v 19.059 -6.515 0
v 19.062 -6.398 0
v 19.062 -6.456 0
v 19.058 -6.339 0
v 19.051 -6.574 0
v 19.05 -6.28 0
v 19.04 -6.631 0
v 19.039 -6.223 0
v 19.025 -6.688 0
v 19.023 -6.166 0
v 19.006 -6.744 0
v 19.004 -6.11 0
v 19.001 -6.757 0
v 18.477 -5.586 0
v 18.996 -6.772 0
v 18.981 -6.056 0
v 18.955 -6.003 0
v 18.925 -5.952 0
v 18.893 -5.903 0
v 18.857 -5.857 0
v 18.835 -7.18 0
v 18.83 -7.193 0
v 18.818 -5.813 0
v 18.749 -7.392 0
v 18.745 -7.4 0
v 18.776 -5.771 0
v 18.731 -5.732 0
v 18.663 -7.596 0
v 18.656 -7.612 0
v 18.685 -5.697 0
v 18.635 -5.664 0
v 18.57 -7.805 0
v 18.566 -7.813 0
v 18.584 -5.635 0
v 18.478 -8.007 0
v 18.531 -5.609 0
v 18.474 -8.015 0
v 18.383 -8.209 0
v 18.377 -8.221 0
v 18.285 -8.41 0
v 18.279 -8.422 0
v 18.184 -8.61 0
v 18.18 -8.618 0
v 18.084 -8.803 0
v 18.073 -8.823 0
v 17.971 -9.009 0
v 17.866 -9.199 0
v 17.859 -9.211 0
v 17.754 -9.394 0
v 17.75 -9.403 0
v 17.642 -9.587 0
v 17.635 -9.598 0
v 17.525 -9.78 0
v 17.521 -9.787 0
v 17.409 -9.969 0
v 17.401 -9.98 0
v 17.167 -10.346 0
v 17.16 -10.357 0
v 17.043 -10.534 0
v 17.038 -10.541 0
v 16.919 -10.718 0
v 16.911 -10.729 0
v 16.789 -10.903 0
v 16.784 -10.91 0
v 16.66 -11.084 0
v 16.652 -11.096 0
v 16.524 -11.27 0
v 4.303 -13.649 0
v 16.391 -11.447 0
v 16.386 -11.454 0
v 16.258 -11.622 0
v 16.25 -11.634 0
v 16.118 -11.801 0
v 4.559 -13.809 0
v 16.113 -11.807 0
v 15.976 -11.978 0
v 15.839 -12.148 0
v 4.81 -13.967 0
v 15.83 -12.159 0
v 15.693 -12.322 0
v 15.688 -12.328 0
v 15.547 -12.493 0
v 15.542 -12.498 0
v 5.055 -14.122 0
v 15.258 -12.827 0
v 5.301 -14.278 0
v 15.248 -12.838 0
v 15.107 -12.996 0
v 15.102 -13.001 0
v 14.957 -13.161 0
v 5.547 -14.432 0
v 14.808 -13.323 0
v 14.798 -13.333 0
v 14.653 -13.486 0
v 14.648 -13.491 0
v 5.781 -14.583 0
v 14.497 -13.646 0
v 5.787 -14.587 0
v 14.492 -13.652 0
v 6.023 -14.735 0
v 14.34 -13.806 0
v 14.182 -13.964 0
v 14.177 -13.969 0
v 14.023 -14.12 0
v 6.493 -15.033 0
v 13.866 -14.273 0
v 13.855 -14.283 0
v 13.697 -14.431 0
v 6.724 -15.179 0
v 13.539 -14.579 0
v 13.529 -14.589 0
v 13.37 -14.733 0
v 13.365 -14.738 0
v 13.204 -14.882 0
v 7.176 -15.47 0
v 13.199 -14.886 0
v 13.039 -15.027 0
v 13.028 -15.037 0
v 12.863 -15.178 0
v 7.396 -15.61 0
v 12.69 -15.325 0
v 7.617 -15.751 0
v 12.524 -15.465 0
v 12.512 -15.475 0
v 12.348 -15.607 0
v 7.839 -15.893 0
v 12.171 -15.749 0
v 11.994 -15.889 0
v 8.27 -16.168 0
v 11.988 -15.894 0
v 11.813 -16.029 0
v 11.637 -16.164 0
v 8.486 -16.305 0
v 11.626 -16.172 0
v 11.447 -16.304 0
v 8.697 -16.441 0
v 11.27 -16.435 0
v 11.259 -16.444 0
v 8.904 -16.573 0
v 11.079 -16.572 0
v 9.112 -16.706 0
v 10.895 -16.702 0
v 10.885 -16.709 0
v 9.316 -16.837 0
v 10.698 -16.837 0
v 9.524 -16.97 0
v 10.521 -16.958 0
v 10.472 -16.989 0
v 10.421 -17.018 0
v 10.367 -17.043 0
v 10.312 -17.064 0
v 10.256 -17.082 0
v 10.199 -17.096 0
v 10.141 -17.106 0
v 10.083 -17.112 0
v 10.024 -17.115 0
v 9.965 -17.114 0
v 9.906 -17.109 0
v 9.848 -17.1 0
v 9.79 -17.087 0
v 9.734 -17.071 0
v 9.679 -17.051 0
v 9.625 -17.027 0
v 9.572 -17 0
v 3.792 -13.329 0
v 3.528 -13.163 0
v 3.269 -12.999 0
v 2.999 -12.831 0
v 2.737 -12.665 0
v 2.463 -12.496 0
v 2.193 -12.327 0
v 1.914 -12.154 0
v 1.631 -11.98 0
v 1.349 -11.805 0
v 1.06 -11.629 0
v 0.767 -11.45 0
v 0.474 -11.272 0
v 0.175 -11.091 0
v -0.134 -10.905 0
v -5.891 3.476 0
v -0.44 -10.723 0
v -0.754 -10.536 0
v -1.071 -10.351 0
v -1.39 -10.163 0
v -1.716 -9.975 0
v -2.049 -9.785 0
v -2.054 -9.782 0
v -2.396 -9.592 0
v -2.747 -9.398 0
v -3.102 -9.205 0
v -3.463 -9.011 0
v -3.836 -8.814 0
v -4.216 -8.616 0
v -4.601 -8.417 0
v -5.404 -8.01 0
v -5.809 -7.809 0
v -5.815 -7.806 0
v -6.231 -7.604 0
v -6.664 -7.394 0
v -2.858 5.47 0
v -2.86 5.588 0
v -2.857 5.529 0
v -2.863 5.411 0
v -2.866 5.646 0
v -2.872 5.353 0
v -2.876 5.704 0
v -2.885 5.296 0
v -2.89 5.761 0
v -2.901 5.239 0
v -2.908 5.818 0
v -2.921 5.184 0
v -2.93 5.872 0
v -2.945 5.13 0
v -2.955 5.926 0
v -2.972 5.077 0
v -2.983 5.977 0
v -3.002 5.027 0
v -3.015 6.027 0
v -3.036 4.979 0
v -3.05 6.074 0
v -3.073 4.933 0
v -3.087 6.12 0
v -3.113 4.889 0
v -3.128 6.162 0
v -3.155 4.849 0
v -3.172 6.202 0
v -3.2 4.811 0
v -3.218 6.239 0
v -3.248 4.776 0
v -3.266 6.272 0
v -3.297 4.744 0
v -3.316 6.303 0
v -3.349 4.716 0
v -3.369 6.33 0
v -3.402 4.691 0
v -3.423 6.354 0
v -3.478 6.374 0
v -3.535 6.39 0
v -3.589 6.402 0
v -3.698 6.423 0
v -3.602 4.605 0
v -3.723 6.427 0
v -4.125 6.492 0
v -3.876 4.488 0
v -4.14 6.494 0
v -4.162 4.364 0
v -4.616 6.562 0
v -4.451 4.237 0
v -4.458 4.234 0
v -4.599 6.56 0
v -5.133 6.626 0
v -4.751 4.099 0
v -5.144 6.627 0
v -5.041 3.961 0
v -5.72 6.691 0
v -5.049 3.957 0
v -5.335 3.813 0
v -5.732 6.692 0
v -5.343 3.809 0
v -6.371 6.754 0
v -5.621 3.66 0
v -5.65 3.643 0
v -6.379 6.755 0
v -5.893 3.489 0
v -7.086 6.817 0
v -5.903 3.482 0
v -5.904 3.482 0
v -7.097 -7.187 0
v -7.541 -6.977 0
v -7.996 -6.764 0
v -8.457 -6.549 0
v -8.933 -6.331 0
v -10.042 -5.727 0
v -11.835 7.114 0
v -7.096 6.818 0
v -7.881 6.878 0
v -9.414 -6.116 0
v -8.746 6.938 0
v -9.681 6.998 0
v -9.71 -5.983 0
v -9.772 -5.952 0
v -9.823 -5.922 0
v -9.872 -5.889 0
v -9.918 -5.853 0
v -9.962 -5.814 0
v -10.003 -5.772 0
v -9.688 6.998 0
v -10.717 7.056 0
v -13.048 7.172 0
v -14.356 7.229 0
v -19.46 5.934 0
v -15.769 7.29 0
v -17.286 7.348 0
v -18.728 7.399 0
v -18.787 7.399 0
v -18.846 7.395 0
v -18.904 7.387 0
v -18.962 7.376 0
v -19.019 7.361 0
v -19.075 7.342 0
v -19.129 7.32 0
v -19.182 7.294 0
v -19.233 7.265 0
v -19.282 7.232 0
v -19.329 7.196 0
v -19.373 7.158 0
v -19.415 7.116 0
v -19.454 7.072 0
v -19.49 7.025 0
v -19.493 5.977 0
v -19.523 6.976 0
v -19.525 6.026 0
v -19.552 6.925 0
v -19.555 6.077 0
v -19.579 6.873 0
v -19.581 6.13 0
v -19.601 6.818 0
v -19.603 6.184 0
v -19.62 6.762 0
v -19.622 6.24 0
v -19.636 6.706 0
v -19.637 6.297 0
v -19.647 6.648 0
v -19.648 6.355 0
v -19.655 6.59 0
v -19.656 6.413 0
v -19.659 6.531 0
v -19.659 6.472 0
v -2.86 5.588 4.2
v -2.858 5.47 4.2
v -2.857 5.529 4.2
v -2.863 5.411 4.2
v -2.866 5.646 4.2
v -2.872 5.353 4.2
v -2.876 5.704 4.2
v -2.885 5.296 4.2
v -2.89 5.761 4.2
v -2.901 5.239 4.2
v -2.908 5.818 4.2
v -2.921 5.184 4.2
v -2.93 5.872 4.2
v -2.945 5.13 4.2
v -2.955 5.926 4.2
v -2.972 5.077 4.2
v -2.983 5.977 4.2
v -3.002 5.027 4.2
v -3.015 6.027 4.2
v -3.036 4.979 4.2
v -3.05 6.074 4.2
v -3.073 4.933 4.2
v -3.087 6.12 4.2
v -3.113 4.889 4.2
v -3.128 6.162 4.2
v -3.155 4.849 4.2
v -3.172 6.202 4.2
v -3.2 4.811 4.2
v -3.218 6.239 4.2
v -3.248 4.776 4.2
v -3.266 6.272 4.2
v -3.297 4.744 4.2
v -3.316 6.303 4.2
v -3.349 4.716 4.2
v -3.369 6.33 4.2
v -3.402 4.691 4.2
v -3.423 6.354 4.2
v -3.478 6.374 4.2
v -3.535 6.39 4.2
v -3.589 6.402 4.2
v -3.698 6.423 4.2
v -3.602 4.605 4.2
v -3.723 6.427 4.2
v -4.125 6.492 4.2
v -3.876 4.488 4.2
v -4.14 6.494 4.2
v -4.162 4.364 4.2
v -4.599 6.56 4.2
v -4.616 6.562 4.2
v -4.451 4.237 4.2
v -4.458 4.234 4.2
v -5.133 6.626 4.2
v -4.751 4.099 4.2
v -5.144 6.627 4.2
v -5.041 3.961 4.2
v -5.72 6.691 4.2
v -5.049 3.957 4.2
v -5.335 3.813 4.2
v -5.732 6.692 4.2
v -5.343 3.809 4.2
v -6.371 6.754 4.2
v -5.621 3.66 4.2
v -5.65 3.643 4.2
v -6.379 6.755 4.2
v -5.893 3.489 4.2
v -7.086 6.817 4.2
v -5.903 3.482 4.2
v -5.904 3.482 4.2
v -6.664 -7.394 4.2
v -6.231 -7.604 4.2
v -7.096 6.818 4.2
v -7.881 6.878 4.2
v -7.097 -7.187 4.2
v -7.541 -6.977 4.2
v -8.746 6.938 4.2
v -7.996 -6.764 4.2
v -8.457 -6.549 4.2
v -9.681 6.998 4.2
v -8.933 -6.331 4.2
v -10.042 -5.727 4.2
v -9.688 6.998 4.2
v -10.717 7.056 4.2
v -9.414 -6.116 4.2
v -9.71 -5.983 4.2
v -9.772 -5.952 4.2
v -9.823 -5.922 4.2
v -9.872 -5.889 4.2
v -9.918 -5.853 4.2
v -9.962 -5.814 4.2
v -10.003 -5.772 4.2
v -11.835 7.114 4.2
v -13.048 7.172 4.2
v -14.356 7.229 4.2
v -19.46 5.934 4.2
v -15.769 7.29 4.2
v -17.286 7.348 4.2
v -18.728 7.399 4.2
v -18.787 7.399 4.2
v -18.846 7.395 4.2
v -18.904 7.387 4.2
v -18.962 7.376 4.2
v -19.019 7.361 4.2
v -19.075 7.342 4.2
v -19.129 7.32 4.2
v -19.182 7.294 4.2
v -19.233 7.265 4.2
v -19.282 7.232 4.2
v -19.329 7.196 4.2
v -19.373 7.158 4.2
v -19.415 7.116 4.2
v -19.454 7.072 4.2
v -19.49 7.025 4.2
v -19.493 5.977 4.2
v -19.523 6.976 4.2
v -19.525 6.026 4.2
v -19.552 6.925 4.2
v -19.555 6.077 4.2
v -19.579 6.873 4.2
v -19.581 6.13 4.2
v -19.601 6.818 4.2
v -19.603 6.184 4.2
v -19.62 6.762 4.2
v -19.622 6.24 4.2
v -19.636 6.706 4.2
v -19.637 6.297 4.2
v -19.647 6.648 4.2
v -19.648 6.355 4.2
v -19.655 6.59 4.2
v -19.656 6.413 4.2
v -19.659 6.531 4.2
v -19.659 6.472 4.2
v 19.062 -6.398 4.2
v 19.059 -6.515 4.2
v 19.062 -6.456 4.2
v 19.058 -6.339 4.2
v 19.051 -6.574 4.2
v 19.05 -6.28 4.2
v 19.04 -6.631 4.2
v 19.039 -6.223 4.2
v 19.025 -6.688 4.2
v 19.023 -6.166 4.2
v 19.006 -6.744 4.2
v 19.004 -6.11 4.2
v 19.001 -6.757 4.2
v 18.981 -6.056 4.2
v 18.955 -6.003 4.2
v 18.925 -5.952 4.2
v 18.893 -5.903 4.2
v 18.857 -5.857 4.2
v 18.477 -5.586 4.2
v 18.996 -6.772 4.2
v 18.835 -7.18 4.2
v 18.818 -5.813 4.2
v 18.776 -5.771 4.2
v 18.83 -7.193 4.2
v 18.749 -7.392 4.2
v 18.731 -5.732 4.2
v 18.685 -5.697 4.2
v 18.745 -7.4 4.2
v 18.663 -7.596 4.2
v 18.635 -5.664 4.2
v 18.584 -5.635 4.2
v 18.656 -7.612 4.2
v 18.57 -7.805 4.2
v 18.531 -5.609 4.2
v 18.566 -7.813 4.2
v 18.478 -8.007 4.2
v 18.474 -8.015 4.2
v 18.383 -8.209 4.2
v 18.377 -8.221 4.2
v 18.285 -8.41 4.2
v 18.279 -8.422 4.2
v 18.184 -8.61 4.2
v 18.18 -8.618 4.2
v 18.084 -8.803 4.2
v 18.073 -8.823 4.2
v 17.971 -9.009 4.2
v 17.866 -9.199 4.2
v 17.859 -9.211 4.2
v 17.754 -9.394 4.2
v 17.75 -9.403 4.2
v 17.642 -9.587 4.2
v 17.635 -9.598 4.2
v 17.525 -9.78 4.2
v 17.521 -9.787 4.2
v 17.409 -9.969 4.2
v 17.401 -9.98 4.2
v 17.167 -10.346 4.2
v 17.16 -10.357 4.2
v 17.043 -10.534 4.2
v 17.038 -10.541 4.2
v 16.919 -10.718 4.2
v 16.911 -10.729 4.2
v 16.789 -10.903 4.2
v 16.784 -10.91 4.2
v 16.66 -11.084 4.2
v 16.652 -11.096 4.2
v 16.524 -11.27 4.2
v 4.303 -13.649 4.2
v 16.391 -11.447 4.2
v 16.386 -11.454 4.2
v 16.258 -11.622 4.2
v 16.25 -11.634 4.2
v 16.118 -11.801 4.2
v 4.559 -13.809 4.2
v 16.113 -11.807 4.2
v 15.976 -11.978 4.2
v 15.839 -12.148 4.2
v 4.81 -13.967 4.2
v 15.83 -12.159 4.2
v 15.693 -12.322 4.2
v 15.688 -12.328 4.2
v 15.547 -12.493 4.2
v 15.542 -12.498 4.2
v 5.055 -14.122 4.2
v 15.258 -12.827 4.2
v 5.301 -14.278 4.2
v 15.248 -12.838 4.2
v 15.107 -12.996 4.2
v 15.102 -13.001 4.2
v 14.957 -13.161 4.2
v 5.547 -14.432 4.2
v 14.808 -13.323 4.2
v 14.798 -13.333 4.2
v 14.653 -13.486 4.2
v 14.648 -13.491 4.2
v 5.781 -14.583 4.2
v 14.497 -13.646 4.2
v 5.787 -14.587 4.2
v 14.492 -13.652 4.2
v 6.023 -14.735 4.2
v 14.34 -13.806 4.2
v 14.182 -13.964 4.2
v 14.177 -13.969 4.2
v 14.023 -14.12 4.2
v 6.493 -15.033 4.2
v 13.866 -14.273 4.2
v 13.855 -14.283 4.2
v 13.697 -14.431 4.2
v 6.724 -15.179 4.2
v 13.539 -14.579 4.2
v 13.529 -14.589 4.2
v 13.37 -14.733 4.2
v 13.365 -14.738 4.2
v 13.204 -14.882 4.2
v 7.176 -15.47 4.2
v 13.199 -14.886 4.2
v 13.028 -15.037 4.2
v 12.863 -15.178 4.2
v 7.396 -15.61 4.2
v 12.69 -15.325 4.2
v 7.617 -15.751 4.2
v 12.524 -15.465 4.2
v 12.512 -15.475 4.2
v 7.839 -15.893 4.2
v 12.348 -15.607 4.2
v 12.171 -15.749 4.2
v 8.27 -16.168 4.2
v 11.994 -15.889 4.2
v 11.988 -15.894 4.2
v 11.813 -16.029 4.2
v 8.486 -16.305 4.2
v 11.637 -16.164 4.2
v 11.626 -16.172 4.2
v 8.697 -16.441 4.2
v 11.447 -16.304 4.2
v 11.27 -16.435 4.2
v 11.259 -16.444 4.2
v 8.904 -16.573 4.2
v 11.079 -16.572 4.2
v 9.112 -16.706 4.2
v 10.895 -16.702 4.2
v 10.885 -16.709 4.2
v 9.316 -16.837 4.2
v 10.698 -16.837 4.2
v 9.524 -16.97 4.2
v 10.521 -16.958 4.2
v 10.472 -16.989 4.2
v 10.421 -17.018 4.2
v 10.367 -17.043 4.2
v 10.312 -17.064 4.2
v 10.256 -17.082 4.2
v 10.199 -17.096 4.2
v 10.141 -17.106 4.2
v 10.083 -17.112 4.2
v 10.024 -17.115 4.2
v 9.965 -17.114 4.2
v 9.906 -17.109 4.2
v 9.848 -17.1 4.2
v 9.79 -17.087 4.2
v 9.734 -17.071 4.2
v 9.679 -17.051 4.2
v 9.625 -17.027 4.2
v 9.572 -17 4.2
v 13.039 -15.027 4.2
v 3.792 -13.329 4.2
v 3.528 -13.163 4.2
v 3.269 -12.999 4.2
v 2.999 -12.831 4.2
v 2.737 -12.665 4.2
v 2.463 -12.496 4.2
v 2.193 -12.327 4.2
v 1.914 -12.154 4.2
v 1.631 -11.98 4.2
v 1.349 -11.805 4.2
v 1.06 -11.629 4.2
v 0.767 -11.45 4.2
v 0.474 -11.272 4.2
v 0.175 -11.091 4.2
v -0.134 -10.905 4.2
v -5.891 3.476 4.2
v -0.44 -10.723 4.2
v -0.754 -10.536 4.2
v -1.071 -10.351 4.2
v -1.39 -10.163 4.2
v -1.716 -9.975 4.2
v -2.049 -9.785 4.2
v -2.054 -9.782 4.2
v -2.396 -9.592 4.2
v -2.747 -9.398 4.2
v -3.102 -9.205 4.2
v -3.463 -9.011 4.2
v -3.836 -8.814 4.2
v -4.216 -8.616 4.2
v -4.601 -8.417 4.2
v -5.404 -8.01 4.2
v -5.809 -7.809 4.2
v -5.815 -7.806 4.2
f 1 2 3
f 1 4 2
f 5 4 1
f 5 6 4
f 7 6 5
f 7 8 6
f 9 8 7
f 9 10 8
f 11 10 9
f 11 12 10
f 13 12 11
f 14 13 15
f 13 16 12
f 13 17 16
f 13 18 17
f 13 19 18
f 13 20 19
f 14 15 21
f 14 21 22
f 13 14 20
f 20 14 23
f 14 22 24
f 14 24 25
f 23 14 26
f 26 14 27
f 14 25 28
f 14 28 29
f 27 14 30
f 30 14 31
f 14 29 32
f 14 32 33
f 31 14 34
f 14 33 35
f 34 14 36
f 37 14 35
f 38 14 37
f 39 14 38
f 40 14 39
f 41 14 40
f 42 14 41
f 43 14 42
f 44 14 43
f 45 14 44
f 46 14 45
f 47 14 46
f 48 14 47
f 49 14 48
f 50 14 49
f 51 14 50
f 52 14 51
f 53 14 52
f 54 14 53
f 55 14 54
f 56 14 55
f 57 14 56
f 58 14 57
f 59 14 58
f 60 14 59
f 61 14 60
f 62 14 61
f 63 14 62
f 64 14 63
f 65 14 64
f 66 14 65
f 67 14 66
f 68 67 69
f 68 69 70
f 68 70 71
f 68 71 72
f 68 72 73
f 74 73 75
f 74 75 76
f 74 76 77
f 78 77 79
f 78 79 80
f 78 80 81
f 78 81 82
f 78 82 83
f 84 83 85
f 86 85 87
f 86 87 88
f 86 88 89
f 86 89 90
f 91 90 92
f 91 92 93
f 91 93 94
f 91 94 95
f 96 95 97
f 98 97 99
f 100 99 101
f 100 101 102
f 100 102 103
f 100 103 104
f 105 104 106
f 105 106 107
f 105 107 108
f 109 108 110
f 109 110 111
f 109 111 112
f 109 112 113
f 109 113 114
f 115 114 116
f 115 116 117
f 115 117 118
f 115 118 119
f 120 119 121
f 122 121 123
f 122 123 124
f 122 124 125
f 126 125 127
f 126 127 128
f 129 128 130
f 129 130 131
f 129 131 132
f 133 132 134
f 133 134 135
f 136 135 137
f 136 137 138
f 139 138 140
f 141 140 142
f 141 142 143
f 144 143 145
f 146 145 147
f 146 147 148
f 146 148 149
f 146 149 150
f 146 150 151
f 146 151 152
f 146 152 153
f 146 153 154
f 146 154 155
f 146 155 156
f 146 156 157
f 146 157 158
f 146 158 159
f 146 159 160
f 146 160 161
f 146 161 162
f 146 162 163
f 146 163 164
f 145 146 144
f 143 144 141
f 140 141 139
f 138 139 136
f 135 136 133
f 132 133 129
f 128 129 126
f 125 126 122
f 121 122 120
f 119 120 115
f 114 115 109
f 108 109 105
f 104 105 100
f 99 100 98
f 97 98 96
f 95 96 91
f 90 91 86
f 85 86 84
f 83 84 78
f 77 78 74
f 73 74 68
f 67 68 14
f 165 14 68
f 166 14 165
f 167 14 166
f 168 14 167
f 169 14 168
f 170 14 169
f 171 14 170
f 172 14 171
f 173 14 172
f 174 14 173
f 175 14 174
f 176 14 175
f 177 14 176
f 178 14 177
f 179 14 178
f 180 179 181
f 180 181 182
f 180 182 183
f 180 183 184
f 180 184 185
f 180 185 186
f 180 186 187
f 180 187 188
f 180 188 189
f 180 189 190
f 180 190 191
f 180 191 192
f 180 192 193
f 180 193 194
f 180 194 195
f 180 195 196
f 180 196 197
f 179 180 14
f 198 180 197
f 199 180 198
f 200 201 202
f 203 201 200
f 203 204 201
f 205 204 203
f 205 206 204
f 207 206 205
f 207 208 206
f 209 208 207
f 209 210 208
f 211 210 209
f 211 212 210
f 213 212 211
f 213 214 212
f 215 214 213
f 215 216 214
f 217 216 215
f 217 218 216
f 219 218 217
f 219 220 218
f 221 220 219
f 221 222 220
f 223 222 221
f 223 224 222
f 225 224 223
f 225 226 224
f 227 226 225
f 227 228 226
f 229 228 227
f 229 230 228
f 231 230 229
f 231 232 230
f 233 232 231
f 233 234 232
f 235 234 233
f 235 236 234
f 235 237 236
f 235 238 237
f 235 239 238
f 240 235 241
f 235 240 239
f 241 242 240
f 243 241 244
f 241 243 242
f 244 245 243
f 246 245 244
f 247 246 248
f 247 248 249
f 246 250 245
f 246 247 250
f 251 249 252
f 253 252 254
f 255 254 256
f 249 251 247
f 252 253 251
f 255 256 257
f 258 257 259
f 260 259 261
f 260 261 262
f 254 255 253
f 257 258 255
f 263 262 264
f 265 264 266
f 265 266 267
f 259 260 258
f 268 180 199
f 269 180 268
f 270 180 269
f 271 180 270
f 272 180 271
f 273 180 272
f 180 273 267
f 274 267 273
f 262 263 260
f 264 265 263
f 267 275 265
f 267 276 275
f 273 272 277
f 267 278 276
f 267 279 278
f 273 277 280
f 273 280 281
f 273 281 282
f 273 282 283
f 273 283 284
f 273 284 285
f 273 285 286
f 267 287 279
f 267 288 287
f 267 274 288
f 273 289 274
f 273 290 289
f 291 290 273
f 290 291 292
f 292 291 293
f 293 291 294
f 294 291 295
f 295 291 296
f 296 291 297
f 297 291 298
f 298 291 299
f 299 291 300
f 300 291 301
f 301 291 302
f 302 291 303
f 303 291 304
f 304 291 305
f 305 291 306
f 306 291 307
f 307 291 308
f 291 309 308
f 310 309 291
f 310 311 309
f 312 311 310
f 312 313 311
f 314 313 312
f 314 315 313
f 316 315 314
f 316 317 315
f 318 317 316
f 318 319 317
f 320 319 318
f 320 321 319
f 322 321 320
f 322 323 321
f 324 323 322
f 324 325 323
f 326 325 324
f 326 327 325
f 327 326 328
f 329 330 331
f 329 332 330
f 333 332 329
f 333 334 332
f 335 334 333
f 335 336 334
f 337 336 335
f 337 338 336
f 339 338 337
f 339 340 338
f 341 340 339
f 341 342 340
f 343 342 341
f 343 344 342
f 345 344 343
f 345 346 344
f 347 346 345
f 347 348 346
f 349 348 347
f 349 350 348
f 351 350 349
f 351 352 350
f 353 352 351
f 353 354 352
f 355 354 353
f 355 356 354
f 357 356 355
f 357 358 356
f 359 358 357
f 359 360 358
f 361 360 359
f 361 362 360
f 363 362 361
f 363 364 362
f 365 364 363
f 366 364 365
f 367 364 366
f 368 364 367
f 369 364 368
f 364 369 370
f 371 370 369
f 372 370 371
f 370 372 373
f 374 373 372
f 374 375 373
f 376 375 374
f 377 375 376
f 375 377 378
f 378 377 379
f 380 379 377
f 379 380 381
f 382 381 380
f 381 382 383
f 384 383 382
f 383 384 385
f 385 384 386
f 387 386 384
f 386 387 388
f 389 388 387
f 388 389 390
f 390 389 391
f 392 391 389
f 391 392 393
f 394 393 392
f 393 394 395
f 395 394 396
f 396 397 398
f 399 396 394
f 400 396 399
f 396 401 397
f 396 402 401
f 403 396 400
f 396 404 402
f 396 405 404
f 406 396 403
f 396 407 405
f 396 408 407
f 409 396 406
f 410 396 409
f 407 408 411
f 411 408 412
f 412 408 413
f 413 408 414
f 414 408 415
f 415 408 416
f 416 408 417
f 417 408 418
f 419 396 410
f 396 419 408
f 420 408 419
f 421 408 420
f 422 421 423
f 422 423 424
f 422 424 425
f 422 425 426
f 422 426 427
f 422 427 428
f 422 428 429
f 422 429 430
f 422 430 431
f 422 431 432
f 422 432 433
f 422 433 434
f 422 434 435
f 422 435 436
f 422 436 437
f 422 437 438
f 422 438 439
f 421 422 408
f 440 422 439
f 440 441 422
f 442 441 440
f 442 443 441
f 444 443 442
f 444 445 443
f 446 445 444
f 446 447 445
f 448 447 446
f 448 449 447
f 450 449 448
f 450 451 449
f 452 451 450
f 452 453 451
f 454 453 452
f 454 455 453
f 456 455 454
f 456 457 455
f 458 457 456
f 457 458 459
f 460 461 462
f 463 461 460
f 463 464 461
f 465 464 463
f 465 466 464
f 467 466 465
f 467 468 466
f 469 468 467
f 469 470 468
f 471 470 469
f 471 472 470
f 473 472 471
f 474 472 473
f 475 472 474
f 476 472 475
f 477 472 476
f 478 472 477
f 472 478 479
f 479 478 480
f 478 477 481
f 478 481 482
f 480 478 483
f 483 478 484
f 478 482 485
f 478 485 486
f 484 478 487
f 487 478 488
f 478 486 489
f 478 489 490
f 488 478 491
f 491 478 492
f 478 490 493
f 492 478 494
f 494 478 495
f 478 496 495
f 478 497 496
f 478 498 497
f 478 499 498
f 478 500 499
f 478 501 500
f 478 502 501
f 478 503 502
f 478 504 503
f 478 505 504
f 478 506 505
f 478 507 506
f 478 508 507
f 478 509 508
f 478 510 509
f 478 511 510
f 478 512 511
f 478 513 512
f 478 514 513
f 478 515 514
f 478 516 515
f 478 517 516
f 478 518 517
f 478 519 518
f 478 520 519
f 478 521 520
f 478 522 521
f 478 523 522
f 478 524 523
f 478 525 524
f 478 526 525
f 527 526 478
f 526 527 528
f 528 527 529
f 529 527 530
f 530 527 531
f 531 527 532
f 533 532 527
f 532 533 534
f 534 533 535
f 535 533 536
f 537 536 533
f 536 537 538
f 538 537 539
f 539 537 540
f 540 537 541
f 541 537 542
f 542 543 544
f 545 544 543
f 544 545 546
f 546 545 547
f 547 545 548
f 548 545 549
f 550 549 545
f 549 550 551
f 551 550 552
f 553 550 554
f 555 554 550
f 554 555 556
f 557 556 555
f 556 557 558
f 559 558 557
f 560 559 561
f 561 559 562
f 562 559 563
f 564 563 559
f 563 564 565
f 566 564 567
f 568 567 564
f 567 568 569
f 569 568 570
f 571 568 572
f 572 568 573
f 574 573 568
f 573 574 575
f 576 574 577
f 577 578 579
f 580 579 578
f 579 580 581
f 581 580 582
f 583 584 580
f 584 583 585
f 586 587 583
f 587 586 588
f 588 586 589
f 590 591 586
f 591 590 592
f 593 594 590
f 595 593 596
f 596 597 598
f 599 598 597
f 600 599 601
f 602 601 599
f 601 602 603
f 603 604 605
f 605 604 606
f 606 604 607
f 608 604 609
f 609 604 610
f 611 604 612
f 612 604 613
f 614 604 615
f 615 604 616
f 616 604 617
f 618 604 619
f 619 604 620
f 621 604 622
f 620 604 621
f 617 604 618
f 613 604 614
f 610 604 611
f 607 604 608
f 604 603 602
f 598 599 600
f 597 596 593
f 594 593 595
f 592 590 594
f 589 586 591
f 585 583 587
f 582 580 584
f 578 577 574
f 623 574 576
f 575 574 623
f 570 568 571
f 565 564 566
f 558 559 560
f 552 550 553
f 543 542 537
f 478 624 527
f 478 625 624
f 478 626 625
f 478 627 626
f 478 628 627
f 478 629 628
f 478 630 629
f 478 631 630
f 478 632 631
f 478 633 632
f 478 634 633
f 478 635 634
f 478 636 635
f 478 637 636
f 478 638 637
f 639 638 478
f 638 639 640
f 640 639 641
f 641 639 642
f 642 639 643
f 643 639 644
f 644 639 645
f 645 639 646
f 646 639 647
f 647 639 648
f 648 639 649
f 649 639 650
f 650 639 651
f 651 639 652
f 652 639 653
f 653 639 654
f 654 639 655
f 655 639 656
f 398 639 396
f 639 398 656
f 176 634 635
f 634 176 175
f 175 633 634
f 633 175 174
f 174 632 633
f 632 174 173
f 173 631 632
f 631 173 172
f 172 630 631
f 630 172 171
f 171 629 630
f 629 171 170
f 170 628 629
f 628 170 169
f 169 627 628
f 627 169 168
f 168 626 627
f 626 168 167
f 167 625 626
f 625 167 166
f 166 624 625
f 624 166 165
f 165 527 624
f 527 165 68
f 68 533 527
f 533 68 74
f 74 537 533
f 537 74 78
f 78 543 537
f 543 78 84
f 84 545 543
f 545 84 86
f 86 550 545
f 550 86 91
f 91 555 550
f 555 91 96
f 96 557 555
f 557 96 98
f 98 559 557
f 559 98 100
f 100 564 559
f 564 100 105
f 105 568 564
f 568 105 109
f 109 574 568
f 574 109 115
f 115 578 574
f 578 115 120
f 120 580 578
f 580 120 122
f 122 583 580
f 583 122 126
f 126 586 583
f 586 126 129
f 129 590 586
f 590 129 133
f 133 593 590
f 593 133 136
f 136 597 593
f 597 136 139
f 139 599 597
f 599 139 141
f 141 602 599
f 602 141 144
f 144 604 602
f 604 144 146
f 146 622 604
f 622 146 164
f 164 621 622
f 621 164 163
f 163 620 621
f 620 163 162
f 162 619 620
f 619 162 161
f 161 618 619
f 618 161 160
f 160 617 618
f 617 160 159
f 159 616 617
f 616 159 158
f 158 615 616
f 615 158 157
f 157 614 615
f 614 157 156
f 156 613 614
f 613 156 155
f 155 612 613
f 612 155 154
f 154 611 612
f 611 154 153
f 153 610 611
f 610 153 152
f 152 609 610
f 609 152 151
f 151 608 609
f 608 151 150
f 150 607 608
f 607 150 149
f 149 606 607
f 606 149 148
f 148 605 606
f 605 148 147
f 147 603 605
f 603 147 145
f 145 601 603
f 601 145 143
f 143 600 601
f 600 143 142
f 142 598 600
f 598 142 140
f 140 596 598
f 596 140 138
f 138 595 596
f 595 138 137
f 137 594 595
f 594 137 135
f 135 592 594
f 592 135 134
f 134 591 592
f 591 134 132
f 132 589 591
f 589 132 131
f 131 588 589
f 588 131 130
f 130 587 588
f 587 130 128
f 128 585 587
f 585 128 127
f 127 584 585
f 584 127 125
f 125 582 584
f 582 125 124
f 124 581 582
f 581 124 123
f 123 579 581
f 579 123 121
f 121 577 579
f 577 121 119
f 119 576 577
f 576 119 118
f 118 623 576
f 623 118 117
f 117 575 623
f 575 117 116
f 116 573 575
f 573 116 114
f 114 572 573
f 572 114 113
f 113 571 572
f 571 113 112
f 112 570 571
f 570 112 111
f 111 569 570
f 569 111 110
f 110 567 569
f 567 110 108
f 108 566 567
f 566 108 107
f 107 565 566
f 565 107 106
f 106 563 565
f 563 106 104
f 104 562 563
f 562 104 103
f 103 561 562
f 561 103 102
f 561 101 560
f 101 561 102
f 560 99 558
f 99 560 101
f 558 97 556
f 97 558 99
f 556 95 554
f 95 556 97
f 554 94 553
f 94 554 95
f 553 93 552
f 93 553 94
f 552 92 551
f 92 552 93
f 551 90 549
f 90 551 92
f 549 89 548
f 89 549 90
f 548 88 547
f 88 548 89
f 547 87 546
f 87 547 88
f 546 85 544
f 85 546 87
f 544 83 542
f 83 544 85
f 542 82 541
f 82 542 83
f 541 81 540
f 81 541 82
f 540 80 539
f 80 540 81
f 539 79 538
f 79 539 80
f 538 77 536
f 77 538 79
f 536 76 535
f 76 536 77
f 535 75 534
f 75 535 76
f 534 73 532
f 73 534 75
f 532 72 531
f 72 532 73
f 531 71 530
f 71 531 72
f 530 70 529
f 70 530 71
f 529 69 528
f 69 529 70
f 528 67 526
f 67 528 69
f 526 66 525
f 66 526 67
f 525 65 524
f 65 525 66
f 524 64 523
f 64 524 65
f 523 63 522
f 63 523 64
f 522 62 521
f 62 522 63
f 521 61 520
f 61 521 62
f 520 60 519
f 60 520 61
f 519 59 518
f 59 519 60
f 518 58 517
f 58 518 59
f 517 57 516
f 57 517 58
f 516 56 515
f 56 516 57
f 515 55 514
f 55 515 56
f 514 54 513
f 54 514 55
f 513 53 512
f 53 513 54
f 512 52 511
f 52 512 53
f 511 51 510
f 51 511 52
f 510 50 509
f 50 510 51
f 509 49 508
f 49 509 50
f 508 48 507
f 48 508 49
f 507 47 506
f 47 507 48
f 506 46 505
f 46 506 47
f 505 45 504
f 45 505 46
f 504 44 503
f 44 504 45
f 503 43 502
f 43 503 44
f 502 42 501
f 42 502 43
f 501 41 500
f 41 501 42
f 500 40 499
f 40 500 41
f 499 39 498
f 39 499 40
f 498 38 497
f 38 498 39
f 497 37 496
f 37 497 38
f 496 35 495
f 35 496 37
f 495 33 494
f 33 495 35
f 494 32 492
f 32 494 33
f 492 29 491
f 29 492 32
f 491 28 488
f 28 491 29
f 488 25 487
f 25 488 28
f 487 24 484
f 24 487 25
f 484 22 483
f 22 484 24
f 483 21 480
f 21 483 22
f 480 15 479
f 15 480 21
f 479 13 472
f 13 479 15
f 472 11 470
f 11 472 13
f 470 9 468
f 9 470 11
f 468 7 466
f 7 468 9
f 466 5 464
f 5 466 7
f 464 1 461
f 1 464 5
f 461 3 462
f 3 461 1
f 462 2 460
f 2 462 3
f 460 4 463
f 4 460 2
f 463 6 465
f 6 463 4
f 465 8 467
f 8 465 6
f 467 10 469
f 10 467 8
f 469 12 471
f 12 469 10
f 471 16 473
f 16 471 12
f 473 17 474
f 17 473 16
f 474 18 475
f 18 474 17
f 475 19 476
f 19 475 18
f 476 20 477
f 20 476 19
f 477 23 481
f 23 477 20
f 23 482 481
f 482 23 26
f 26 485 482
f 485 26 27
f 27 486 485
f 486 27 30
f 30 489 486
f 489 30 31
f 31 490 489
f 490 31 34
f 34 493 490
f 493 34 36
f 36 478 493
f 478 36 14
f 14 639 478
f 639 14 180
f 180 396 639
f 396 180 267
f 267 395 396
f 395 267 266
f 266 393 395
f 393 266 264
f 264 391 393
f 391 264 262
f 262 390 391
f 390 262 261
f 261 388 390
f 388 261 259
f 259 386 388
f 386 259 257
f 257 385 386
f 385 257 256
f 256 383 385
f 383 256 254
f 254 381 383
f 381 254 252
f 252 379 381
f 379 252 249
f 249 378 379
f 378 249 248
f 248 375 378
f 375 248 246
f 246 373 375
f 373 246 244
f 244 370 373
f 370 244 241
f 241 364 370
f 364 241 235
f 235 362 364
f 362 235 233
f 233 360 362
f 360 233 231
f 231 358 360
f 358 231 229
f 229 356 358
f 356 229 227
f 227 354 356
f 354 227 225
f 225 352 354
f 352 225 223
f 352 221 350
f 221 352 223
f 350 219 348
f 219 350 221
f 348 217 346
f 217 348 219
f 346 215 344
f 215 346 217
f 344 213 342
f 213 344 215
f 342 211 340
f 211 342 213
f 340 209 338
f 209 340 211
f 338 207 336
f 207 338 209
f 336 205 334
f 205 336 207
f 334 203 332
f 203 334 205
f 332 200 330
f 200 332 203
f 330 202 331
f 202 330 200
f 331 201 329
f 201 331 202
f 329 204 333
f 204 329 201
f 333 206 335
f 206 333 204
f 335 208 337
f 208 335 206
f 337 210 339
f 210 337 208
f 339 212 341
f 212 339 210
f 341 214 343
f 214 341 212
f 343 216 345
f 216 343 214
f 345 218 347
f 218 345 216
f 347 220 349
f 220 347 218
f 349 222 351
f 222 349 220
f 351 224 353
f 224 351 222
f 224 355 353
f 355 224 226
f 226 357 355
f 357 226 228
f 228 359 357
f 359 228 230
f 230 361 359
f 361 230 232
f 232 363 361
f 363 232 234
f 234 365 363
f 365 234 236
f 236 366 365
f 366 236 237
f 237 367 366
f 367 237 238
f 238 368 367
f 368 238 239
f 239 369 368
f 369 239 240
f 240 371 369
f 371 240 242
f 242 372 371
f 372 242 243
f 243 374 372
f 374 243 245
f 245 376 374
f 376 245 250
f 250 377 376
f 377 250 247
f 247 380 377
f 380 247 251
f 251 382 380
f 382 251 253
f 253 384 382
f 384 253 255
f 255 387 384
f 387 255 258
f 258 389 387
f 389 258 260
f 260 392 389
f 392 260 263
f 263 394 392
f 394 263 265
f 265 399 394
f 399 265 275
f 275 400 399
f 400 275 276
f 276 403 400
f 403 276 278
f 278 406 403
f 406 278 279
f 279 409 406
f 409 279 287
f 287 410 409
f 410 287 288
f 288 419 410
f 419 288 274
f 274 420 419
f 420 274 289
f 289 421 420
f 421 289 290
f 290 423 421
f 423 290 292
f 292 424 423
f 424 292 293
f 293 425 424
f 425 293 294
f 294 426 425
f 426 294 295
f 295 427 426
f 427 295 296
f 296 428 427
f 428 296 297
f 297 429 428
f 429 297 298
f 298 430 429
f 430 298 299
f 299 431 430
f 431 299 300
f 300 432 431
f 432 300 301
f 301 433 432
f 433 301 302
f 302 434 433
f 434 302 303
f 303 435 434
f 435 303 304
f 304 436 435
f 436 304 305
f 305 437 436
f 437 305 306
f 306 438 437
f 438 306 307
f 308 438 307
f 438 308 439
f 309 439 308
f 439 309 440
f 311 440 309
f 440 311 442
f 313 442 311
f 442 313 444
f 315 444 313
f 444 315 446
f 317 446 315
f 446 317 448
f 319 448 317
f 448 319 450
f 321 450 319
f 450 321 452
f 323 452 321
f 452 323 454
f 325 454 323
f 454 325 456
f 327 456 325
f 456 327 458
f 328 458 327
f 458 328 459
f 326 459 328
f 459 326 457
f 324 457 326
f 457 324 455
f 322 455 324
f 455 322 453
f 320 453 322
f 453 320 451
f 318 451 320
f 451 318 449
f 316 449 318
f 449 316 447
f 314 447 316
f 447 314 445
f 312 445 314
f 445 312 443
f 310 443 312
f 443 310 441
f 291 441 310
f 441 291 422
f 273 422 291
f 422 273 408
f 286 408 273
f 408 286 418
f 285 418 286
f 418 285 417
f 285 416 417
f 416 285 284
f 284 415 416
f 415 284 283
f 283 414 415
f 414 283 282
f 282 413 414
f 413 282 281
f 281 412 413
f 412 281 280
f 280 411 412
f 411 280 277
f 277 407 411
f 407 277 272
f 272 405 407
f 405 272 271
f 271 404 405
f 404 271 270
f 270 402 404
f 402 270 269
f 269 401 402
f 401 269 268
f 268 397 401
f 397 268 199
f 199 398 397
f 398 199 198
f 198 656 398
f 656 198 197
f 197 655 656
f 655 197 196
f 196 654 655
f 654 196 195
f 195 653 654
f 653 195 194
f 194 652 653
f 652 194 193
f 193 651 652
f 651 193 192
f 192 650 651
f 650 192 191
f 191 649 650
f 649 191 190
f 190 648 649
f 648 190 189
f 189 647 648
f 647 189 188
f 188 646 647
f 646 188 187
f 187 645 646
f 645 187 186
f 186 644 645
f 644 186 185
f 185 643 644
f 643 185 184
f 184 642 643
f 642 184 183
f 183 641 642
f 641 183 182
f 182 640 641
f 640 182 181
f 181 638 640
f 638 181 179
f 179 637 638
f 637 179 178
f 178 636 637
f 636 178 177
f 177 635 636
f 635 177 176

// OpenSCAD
$fn=96;
thickness_mm = 4.2;
pts = [[-5.9047, 3.4815], [-5.6357, 3.6524], [-5.3391, 3.8108], [-5.045, 3.9591], [-4.7484, 4.0999], [-4.4543, 4.2356], [-4.1627, 4.3638], [-3.8787, 4.487], [-3.6021, 4.6051], [-3.3382, 4.7182], [-3.0893, 4.8263], [-2.8581, 4.9319], [-2.6469, 5.0325], [-2.4584, 5.1305], [-2.2975, 5.226], [-2.1643, 5.319], [-2.0587, 5.4095], [-1.9808, 5.4975], [-1.9331, 5.583], [-1.9155, 5.6659], [-1.928, 5.7489], [-1.9708, 5.8293], [-2.0462, 5.9097], [-2.1593, 5.9877], [-2.3101, 6.0631], [-2.5011, 6.1385], [-2.7349, 6.2114], [-3.0139, 6.2843], [-3.3382, 6.3547], [-3.7102, 6.4251], [-4.1326, 6.4929], [-4.6076, 6.5608], [-5.138, 6.6262], [-5.7263, 6.6915], [-6.3748, 6.7544], [-7.0912, 6.8172], [-7.878, 6.8775], [-8.7427, 6.9379], [-9.6854, 6.9982], [-10.716, 7.056], [-11.8321, 7.1138], [-13.0462, 7.1716], [-14.3558, 7.2295], [-15.766, 7.2898], [-17.2843, 7.3476], [-18.9232, 7.4054], [-20.6954, 7.4632], [-9.9066, -5.8947], [-9.4139, -6.1159], [-8.9312, -6.332], [-8.4587, -6.5482], [-7.9961, -6.7644], [-7.5437, -6.9756], [-7.0987, -7.1867], [-6.6613, -7.3953], [-6.2315, -7.604], [-5.8117, -7.8076], [-5.402, -8.0112], [-4.9998, -8.2148], [-4.6026, -8.4159], [-4.218, -8.6145], [-3.8384, -8.8131], [-3.4664, -9.0092], [-3.1019, -9.2052], [-2.745, -9.3988], [-2.3956, -9.5923], [-2.0512, -9.7834], [-1.7169, -9.9744], [-1.3901, -10.163], [-1.0708, -10.3515], [-0.7516, -10.5375], [-0.4399, -10.7235], [-0.1307, -10.907], [0.1735, -11.0905], [0.4726, -11.2715], [0.7667, -11.45], [1.0583, -11.6284], [1.3473, -11.8044], [1.6314, -11.9804], [1.9129, -12.1538], [2.1894, -12.3247], [2.4634, -12.4957], [2.7349, -12.6641], [3.0014, -12.8325], [3.2678, -12.9984], [3.5293, -13.1643], [3.7907, -13.3277], [4.0471, -13.4886], [4.3035, -13.6495], [4.5574, -13.8078], [4.8088, -13.9662], [5.0551, -14.122], [5.3014, -14.2779], [5.5453, -14.4312], [5.7841, -14.5846], [6.0229, -14.7354], [6.2566, -14.8837], [6.4904, -15.032], [6.7217, -15.1778], [6.9479, -15.3236], [7.1741, -15.4694], [7.3953, -15.6102], [7.6166, -15.7509], [7.8378, -15.8917], [8.0539, -16.0299], [8.2701, -16.1682], [8.4838, -16.304], [8.6949, -16.4397], [8.9036, -16.5729], [9.1122, -16.7061], [9.3158, -16.8369], [9.5194, -16.9676], [9.7205, -17.0983], [9.9191, -17.2265], [10.1177, -17.2265], [10.3138, -17.0983], [10.5073, -16.9676], [10.6984, -16.8369], [10.8894, -16.7061], [11.0779, -16.5729], [11.264, -16.4397], [11.4475, -16.304], [11.631, -16.1682], [11.8119, -16.0299], [11.9904, -15.8917], [12.1689, -15.7509], [12.3449, -15.6102], [12.5183, -15.4694], [12.6917, -15.3236], [12.8627, -15.1778], [13.0336, -15.032], [13.202, -14.8837], [13.3679, -14.7354], [13.5338, -14.5846], [13.6972, -14.4312], [13.8606, -14.2779], [14.0215, -14.122], [14.1799, -13.9662], [14.3382, -13.8078], [14.4941, -13.6495], [14.6499, -13.4886], [14.8033, -13.3277], [14.9541, -13.1643], [15.1049, -12.9984], [15.2532, -12.8325], [15.399, -12.6641], [15.5448, -12.4957], [15.6906, -12.3247], [15.8339, -12.1538], [15.9747, -11.9804], [16.1154, -11.8044], [16.2537, -11.6284], [16.3894, -11.45], [16.5226, -11.2715], [16.6559, -11.0905], [16.7866, -10.907], [16.9148, -10.7235], [17.0405, -10.5375], [17.1636, -10.3515], [17.2843, -10.163], [17.405, -9.9744], [17.5231, -9.7834], [17.6387, -9.5923], [17.7519, -9.3988], [17.8625, -9.2052], [17.9706, -9.0092], [18.0787, -8.8131], [18.1817, -8.6145], [18.2823, -8.4159], [18.3803, -8.2148], [18.4758, -8.0112], [18.5688, -7.8076], [18.6593, -7.604], [18.7473, -7.3953], [18.8328, -7.1867], [18.9157, -6.9756], [18.9987, -6.7644], [19.0791, -6.5482], [19.157, -6.332], [19.2324, -6.1159], [19.3053, -5.8947]];
hole = [2.5, 16.0, 2.6];
offset_r = 0.9;
module shape2d(){
  // Robust CGAL render + REGULATION:
  // offset(+r) offset(-r) cleans self-intersections and controls roundness.
  offset(r=offset_r) offset(r=-offset_r)
    polygon(points=pts, paths=[[for(i=[0:len(pts)-1]) i]]);
}
module body(){
  linear_extrude(height=thickness_mm, convexity=10)
    shape2d();
}
difference(){
  body();
  translate([hole[0], hole[1], -1])
    cylinder(h=thickness_mm+2, r=hole[2]);
}
